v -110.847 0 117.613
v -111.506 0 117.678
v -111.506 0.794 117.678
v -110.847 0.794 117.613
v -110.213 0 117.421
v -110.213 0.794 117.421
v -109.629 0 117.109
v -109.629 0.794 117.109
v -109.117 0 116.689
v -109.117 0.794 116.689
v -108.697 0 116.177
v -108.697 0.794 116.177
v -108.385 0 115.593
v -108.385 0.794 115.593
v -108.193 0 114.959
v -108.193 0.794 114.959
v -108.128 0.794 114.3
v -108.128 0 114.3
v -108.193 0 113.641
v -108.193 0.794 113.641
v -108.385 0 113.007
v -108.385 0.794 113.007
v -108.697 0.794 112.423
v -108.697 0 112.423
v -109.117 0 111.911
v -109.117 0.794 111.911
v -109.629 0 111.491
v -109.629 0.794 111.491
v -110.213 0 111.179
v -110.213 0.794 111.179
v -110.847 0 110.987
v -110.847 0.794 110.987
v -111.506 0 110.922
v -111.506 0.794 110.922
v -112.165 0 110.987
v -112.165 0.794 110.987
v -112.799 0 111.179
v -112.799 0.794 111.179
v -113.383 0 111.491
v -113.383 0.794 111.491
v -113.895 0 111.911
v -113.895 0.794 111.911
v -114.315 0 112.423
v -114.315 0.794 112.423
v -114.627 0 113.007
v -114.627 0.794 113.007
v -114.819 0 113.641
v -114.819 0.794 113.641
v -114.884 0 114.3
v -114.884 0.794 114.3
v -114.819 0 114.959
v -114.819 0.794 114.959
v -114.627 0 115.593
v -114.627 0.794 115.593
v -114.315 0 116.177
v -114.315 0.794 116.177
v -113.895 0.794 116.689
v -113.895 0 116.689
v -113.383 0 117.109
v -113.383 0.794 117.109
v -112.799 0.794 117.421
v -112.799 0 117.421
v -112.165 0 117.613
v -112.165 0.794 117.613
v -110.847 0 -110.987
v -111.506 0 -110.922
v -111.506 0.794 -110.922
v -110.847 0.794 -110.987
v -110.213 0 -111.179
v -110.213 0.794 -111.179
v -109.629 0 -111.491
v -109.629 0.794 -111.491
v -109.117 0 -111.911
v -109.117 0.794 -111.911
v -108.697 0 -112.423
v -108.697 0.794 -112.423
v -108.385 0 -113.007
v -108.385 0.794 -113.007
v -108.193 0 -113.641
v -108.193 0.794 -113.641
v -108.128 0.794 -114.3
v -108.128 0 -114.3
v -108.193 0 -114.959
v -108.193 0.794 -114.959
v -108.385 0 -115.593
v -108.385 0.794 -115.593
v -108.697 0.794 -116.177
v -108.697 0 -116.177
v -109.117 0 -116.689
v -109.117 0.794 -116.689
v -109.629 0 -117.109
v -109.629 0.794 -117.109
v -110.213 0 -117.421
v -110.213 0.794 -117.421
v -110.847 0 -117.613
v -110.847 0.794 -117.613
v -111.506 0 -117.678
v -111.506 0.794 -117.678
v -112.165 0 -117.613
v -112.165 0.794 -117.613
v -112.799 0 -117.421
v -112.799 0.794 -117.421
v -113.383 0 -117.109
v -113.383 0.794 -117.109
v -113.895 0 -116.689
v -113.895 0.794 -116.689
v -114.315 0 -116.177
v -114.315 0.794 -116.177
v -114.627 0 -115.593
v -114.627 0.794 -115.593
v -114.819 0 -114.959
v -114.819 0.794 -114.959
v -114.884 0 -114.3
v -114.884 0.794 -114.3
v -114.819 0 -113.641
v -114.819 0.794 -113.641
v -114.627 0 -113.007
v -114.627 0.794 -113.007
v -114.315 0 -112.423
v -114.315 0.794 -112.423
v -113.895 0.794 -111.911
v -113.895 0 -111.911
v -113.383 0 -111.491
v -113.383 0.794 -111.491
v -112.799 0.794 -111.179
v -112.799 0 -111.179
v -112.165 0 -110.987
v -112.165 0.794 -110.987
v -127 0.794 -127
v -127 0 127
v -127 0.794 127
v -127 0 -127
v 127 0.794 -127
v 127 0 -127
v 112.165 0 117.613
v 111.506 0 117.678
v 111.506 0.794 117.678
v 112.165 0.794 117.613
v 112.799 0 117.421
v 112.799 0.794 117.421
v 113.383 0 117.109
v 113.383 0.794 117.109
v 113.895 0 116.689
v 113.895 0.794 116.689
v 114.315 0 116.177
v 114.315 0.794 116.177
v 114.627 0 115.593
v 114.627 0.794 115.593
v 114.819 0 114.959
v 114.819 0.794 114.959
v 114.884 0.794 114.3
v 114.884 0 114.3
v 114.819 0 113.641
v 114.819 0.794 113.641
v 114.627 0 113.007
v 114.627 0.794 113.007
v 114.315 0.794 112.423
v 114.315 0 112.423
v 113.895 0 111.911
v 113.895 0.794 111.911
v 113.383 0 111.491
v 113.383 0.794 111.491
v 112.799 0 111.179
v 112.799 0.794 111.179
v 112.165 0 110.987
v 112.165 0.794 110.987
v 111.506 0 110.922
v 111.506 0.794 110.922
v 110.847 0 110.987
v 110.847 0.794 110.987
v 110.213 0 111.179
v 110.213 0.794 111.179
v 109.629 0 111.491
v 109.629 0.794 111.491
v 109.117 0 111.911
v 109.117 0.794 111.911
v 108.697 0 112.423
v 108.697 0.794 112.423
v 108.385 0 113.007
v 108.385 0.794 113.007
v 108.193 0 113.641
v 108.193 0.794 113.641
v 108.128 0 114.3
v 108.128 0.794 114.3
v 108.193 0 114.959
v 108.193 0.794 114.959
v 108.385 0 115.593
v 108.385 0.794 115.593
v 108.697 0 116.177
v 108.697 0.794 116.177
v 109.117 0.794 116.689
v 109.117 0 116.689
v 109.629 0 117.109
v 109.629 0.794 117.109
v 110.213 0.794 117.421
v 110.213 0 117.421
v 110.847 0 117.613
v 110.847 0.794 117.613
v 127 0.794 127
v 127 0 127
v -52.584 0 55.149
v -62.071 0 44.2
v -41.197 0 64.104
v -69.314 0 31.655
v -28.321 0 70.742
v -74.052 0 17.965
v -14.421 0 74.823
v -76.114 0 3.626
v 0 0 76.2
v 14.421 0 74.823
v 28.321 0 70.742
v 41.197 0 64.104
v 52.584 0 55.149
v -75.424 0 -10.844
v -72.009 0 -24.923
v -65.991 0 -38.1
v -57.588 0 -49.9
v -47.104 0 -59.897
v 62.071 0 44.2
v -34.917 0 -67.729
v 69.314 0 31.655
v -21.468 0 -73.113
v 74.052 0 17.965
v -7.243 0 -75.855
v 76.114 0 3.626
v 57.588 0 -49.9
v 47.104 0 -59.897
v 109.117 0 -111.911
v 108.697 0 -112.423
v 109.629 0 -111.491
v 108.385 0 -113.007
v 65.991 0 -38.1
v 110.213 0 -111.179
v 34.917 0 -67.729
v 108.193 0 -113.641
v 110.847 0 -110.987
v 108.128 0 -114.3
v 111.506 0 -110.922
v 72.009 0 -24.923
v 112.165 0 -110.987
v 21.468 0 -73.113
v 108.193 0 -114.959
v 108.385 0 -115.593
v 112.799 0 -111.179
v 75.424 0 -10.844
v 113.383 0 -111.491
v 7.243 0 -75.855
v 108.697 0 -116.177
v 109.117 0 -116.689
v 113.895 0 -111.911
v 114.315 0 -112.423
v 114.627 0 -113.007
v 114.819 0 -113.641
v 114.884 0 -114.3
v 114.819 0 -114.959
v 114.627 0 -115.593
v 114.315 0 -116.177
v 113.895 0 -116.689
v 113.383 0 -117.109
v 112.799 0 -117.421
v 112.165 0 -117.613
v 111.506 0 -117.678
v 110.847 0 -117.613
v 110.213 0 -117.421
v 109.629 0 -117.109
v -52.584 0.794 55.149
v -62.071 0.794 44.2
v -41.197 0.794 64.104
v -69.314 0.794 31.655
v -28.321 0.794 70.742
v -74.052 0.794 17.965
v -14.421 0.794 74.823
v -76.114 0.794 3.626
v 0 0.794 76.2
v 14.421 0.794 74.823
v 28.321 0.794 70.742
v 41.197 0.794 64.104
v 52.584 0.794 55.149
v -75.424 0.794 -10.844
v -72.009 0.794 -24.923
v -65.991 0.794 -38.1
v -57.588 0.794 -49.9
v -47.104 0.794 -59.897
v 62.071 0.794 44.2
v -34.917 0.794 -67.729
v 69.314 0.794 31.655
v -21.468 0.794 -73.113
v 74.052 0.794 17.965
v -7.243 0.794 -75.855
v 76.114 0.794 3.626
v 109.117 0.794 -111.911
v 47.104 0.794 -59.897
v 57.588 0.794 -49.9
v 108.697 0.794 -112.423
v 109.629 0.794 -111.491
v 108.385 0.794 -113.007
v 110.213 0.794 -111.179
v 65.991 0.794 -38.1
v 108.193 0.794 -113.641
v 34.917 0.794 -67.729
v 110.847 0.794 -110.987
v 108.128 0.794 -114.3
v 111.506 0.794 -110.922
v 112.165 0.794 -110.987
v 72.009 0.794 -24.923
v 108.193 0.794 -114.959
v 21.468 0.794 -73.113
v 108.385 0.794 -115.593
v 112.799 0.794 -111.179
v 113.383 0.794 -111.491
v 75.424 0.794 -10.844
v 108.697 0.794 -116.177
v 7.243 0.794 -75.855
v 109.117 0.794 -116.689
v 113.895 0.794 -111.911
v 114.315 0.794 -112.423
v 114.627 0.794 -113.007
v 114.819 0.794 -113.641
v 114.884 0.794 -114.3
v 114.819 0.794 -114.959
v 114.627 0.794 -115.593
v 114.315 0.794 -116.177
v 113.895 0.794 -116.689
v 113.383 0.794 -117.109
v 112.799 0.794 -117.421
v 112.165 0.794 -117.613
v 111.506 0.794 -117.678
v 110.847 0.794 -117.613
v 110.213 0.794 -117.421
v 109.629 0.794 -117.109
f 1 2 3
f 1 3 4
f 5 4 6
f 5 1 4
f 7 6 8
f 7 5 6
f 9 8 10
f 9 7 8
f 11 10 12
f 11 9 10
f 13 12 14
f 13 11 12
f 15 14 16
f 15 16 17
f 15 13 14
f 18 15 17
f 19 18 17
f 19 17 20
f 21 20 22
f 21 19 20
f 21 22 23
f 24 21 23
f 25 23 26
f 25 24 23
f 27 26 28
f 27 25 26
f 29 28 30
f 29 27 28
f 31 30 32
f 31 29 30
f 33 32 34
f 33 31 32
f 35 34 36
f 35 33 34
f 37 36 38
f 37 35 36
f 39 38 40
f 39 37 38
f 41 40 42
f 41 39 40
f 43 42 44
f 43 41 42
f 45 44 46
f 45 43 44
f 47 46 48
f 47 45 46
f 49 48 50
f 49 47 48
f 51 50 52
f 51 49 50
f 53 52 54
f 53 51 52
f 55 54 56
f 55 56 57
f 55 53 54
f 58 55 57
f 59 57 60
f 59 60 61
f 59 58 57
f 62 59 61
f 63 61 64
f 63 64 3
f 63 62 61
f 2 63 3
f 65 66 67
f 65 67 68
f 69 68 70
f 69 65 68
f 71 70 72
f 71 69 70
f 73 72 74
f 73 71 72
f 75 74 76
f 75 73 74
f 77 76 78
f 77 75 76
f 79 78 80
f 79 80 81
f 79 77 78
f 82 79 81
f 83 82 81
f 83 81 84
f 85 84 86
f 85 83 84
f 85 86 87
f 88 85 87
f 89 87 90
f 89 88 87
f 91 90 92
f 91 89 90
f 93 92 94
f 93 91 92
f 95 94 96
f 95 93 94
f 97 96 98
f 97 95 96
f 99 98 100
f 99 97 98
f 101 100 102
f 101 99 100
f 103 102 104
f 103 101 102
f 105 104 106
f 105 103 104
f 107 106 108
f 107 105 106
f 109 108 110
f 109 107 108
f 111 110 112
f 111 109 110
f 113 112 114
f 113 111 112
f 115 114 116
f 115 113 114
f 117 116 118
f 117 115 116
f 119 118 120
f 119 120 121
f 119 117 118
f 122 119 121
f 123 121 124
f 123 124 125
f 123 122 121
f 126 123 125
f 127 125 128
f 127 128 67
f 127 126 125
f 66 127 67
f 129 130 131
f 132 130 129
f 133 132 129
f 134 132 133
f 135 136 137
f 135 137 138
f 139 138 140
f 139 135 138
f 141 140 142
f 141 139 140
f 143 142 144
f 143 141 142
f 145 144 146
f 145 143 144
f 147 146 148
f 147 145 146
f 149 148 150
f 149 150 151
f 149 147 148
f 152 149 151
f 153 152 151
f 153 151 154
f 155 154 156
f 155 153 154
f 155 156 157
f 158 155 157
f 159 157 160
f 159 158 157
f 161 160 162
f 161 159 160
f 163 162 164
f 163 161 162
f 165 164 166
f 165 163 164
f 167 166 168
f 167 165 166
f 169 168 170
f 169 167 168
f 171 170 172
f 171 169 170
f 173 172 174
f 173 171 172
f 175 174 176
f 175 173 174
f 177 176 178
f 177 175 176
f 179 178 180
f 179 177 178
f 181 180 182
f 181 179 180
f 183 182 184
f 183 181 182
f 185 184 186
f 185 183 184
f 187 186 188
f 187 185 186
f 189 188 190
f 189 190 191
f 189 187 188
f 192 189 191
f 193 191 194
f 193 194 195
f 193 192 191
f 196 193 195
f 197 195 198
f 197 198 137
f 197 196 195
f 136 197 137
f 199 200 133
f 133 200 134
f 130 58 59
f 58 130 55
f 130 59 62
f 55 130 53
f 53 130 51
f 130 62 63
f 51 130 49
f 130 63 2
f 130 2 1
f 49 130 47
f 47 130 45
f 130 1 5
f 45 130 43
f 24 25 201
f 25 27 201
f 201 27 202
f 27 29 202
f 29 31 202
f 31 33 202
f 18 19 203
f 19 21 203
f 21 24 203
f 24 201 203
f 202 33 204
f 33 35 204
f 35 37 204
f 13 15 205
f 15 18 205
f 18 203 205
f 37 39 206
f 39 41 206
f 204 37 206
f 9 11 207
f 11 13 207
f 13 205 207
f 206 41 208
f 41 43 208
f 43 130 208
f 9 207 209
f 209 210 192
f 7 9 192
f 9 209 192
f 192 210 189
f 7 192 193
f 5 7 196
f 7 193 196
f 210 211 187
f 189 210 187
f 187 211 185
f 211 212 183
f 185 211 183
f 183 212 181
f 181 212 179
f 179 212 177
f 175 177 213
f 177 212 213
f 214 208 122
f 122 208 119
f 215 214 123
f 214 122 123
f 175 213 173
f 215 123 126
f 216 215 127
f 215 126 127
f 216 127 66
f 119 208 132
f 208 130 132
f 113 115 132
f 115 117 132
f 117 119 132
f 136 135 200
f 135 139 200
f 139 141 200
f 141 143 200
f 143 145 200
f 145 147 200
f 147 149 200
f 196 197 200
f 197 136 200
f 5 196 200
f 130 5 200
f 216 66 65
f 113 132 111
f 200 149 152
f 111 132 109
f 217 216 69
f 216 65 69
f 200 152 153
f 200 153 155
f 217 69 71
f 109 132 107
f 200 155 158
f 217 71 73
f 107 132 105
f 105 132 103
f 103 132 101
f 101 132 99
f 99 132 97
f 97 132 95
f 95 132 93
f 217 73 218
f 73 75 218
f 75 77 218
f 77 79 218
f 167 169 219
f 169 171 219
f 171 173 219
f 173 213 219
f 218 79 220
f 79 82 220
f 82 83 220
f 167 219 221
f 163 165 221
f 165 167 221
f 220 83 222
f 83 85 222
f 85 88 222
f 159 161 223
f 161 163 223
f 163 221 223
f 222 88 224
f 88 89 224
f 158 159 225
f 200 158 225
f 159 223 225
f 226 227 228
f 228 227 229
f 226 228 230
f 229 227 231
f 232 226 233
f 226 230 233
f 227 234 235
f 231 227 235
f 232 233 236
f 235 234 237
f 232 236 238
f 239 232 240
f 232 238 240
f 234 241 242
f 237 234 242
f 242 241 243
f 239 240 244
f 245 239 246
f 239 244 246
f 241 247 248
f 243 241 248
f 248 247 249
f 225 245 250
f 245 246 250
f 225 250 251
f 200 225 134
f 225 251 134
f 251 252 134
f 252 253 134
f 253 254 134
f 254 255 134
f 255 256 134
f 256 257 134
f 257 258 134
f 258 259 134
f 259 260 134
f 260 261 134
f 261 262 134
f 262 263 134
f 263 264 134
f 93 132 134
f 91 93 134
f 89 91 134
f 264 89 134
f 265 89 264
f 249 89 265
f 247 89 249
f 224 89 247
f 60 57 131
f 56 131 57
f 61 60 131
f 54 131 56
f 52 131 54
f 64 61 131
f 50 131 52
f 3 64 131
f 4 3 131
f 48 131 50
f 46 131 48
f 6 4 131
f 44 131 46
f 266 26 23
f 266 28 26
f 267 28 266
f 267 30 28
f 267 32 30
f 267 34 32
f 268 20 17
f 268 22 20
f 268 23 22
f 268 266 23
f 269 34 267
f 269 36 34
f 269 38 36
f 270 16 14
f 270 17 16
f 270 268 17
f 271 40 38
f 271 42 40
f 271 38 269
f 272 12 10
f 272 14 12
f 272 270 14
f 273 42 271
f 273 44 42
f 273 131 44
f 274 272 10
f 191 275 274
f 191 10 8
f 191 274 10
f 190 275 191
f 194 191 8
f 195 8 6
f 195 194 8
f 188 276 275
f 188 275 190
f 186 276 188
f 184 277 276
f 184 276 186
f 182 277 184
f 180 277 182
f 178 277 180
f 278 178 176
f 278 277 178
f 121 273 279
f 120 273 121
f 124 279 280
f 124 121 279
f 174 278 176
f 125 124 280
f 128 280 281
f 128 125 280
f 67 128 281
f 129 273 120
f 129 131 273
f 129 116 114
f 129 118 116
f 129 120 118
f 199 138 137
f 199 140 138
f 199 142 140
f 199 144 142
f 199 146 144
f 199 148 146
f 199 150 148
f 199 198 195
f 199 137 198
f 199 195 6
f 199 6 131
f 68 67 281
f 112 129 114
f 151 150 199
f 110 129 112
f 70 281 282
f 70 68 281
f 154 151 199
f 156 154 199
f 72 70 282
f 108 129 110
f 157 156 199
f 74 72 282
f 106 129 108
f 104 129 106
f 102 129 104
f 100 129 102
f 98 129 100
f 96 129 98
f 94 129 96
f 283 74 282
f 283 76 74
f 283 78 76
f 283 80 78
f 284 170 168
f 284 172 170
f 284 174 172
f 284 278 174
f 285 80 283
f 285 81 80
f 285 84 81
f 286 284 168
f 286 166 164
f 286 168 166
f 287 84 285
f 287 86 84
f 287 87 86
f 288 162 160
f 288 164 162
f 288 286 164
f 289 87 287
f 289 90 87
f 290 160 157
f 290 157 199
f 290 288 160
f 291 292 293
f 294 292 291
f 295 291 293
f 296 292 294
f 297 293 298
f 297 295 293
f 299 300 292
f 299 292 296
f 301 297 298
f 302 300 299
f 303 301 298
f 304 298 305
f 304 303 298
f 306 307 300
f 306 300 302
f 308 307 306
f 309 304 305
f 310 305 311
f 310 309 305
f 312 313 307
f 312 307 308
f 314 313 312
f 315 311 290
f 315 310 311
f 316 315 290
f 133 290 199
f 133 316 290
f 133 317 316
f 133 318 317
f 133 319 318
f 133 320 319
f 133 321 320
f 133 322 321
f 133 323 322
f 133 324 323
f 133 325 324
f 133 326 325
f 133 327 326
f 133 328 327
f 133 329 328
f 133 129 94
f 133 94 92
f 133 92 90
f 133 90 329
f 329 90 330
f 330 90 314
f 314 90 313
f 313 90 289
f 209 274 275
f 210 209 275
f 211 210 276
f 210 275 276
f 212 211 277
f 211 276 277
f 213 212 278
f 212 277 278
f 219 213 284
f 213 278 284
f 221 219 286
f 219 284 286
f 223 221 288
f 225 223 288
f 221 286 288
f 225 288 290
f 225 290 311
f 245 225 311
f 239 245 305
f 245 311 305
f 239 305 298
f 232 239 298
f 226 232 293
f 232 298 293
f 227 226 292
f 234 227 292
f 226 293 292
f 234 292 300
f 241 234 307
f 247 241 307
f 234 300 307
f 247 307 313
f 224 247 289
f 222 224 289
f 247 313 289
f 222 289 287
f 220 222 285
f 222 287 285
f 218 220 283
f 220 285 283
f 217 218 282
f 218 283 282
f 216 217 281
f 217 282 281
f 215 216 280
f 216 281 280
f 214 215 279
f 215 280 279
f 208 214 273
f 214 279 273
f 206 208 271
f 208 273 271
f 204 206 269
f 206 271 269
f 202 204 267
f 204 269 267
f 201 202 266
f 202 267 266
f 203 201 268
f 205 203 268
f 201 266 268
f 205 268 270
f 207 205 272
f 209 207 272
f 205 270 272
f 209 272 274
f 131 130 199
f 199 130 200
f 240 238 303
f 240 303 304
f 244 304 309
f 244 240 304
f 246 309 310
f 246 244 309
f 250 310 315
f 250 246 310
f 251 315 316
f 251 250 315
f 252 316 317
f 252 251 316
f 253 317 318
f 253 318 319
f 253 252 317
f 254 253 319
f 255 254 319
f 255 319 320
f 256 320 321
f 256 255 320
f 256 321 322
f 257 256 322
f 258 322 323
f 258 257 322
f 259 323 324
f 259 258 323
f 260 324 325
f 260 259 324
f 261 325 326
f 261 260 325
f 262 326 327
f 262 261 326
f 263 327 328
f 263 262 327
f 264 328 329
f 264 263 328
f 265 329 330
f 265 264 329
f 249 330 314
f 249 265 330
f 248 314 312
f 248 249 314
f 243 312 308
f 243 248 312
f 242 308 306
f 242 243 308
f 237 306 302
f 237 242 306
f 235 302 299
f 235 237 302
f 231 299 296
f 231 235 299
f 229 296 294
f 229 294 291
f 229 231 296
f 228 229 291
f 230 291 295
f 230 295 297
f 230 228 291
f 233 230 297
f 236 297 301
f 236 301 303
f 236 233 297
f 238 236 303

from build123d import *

# Parameters (mm, degrees)
SKETCH1_W           = 254
SKETCH1_H           = 254
SKETCH1_R           = 3.3782
BOSS_EXTRUDE1_DEPTH = 0.79375
SKETCH2_R           = 76.2
CUT_EXTRUDE1_DEPTH  = 0.79375


with BuildPart() as part:
    # Sketch1 → Boss-Extrude1 (new body)
    with BuildSketch(Plane(origin=(0, 0, 0), x_dir=(1, 0, 0), z_dir=(0, 1, 0))):
        Rectangle(SKETCH1_W, SKETCH1_H)
        with Locations(Location((-111.506, 114.3, 0), (0, 0, 270))):
            Circle(SKETCH1_R, mode=Mode.SUBTRACT)
        with Locations(Location((111.506, 114.3, 0), (0, 0, 270))):
            Circle(SKETCH1_R, mode=Mode.SUBTRACT)
        with Locations(Location((111.506, -114.3, 0), (0, 0, 270))):
            Circle(SKETCH1_R, mode=Mode.SUBTRACT)
        with Locations(Location((-111.506, -114.3, 0), (0, 0, 270))):
            Circle(SKETCH1_R, mode=Mode.SUBTRACT)
    extrude(amount=BOSS_EXTRUDE1_DEPTH)

    # Sketch2 → Cut-Extrude1 (cut)
    with BuildSketch(Plane(origin=(0, 0.79375, 0), x_dir=(1, 0, 0), z_dir=(0, 1, 0))):
        with Locations(Location((0, 0, 0), (0, 0, 270))):
            Circle(SKETCH2_R)
    extrude(amount=-CUT_EXTRUDE1_DEPTH, mode=Mode.SUBTRACT)


solid = part.part
